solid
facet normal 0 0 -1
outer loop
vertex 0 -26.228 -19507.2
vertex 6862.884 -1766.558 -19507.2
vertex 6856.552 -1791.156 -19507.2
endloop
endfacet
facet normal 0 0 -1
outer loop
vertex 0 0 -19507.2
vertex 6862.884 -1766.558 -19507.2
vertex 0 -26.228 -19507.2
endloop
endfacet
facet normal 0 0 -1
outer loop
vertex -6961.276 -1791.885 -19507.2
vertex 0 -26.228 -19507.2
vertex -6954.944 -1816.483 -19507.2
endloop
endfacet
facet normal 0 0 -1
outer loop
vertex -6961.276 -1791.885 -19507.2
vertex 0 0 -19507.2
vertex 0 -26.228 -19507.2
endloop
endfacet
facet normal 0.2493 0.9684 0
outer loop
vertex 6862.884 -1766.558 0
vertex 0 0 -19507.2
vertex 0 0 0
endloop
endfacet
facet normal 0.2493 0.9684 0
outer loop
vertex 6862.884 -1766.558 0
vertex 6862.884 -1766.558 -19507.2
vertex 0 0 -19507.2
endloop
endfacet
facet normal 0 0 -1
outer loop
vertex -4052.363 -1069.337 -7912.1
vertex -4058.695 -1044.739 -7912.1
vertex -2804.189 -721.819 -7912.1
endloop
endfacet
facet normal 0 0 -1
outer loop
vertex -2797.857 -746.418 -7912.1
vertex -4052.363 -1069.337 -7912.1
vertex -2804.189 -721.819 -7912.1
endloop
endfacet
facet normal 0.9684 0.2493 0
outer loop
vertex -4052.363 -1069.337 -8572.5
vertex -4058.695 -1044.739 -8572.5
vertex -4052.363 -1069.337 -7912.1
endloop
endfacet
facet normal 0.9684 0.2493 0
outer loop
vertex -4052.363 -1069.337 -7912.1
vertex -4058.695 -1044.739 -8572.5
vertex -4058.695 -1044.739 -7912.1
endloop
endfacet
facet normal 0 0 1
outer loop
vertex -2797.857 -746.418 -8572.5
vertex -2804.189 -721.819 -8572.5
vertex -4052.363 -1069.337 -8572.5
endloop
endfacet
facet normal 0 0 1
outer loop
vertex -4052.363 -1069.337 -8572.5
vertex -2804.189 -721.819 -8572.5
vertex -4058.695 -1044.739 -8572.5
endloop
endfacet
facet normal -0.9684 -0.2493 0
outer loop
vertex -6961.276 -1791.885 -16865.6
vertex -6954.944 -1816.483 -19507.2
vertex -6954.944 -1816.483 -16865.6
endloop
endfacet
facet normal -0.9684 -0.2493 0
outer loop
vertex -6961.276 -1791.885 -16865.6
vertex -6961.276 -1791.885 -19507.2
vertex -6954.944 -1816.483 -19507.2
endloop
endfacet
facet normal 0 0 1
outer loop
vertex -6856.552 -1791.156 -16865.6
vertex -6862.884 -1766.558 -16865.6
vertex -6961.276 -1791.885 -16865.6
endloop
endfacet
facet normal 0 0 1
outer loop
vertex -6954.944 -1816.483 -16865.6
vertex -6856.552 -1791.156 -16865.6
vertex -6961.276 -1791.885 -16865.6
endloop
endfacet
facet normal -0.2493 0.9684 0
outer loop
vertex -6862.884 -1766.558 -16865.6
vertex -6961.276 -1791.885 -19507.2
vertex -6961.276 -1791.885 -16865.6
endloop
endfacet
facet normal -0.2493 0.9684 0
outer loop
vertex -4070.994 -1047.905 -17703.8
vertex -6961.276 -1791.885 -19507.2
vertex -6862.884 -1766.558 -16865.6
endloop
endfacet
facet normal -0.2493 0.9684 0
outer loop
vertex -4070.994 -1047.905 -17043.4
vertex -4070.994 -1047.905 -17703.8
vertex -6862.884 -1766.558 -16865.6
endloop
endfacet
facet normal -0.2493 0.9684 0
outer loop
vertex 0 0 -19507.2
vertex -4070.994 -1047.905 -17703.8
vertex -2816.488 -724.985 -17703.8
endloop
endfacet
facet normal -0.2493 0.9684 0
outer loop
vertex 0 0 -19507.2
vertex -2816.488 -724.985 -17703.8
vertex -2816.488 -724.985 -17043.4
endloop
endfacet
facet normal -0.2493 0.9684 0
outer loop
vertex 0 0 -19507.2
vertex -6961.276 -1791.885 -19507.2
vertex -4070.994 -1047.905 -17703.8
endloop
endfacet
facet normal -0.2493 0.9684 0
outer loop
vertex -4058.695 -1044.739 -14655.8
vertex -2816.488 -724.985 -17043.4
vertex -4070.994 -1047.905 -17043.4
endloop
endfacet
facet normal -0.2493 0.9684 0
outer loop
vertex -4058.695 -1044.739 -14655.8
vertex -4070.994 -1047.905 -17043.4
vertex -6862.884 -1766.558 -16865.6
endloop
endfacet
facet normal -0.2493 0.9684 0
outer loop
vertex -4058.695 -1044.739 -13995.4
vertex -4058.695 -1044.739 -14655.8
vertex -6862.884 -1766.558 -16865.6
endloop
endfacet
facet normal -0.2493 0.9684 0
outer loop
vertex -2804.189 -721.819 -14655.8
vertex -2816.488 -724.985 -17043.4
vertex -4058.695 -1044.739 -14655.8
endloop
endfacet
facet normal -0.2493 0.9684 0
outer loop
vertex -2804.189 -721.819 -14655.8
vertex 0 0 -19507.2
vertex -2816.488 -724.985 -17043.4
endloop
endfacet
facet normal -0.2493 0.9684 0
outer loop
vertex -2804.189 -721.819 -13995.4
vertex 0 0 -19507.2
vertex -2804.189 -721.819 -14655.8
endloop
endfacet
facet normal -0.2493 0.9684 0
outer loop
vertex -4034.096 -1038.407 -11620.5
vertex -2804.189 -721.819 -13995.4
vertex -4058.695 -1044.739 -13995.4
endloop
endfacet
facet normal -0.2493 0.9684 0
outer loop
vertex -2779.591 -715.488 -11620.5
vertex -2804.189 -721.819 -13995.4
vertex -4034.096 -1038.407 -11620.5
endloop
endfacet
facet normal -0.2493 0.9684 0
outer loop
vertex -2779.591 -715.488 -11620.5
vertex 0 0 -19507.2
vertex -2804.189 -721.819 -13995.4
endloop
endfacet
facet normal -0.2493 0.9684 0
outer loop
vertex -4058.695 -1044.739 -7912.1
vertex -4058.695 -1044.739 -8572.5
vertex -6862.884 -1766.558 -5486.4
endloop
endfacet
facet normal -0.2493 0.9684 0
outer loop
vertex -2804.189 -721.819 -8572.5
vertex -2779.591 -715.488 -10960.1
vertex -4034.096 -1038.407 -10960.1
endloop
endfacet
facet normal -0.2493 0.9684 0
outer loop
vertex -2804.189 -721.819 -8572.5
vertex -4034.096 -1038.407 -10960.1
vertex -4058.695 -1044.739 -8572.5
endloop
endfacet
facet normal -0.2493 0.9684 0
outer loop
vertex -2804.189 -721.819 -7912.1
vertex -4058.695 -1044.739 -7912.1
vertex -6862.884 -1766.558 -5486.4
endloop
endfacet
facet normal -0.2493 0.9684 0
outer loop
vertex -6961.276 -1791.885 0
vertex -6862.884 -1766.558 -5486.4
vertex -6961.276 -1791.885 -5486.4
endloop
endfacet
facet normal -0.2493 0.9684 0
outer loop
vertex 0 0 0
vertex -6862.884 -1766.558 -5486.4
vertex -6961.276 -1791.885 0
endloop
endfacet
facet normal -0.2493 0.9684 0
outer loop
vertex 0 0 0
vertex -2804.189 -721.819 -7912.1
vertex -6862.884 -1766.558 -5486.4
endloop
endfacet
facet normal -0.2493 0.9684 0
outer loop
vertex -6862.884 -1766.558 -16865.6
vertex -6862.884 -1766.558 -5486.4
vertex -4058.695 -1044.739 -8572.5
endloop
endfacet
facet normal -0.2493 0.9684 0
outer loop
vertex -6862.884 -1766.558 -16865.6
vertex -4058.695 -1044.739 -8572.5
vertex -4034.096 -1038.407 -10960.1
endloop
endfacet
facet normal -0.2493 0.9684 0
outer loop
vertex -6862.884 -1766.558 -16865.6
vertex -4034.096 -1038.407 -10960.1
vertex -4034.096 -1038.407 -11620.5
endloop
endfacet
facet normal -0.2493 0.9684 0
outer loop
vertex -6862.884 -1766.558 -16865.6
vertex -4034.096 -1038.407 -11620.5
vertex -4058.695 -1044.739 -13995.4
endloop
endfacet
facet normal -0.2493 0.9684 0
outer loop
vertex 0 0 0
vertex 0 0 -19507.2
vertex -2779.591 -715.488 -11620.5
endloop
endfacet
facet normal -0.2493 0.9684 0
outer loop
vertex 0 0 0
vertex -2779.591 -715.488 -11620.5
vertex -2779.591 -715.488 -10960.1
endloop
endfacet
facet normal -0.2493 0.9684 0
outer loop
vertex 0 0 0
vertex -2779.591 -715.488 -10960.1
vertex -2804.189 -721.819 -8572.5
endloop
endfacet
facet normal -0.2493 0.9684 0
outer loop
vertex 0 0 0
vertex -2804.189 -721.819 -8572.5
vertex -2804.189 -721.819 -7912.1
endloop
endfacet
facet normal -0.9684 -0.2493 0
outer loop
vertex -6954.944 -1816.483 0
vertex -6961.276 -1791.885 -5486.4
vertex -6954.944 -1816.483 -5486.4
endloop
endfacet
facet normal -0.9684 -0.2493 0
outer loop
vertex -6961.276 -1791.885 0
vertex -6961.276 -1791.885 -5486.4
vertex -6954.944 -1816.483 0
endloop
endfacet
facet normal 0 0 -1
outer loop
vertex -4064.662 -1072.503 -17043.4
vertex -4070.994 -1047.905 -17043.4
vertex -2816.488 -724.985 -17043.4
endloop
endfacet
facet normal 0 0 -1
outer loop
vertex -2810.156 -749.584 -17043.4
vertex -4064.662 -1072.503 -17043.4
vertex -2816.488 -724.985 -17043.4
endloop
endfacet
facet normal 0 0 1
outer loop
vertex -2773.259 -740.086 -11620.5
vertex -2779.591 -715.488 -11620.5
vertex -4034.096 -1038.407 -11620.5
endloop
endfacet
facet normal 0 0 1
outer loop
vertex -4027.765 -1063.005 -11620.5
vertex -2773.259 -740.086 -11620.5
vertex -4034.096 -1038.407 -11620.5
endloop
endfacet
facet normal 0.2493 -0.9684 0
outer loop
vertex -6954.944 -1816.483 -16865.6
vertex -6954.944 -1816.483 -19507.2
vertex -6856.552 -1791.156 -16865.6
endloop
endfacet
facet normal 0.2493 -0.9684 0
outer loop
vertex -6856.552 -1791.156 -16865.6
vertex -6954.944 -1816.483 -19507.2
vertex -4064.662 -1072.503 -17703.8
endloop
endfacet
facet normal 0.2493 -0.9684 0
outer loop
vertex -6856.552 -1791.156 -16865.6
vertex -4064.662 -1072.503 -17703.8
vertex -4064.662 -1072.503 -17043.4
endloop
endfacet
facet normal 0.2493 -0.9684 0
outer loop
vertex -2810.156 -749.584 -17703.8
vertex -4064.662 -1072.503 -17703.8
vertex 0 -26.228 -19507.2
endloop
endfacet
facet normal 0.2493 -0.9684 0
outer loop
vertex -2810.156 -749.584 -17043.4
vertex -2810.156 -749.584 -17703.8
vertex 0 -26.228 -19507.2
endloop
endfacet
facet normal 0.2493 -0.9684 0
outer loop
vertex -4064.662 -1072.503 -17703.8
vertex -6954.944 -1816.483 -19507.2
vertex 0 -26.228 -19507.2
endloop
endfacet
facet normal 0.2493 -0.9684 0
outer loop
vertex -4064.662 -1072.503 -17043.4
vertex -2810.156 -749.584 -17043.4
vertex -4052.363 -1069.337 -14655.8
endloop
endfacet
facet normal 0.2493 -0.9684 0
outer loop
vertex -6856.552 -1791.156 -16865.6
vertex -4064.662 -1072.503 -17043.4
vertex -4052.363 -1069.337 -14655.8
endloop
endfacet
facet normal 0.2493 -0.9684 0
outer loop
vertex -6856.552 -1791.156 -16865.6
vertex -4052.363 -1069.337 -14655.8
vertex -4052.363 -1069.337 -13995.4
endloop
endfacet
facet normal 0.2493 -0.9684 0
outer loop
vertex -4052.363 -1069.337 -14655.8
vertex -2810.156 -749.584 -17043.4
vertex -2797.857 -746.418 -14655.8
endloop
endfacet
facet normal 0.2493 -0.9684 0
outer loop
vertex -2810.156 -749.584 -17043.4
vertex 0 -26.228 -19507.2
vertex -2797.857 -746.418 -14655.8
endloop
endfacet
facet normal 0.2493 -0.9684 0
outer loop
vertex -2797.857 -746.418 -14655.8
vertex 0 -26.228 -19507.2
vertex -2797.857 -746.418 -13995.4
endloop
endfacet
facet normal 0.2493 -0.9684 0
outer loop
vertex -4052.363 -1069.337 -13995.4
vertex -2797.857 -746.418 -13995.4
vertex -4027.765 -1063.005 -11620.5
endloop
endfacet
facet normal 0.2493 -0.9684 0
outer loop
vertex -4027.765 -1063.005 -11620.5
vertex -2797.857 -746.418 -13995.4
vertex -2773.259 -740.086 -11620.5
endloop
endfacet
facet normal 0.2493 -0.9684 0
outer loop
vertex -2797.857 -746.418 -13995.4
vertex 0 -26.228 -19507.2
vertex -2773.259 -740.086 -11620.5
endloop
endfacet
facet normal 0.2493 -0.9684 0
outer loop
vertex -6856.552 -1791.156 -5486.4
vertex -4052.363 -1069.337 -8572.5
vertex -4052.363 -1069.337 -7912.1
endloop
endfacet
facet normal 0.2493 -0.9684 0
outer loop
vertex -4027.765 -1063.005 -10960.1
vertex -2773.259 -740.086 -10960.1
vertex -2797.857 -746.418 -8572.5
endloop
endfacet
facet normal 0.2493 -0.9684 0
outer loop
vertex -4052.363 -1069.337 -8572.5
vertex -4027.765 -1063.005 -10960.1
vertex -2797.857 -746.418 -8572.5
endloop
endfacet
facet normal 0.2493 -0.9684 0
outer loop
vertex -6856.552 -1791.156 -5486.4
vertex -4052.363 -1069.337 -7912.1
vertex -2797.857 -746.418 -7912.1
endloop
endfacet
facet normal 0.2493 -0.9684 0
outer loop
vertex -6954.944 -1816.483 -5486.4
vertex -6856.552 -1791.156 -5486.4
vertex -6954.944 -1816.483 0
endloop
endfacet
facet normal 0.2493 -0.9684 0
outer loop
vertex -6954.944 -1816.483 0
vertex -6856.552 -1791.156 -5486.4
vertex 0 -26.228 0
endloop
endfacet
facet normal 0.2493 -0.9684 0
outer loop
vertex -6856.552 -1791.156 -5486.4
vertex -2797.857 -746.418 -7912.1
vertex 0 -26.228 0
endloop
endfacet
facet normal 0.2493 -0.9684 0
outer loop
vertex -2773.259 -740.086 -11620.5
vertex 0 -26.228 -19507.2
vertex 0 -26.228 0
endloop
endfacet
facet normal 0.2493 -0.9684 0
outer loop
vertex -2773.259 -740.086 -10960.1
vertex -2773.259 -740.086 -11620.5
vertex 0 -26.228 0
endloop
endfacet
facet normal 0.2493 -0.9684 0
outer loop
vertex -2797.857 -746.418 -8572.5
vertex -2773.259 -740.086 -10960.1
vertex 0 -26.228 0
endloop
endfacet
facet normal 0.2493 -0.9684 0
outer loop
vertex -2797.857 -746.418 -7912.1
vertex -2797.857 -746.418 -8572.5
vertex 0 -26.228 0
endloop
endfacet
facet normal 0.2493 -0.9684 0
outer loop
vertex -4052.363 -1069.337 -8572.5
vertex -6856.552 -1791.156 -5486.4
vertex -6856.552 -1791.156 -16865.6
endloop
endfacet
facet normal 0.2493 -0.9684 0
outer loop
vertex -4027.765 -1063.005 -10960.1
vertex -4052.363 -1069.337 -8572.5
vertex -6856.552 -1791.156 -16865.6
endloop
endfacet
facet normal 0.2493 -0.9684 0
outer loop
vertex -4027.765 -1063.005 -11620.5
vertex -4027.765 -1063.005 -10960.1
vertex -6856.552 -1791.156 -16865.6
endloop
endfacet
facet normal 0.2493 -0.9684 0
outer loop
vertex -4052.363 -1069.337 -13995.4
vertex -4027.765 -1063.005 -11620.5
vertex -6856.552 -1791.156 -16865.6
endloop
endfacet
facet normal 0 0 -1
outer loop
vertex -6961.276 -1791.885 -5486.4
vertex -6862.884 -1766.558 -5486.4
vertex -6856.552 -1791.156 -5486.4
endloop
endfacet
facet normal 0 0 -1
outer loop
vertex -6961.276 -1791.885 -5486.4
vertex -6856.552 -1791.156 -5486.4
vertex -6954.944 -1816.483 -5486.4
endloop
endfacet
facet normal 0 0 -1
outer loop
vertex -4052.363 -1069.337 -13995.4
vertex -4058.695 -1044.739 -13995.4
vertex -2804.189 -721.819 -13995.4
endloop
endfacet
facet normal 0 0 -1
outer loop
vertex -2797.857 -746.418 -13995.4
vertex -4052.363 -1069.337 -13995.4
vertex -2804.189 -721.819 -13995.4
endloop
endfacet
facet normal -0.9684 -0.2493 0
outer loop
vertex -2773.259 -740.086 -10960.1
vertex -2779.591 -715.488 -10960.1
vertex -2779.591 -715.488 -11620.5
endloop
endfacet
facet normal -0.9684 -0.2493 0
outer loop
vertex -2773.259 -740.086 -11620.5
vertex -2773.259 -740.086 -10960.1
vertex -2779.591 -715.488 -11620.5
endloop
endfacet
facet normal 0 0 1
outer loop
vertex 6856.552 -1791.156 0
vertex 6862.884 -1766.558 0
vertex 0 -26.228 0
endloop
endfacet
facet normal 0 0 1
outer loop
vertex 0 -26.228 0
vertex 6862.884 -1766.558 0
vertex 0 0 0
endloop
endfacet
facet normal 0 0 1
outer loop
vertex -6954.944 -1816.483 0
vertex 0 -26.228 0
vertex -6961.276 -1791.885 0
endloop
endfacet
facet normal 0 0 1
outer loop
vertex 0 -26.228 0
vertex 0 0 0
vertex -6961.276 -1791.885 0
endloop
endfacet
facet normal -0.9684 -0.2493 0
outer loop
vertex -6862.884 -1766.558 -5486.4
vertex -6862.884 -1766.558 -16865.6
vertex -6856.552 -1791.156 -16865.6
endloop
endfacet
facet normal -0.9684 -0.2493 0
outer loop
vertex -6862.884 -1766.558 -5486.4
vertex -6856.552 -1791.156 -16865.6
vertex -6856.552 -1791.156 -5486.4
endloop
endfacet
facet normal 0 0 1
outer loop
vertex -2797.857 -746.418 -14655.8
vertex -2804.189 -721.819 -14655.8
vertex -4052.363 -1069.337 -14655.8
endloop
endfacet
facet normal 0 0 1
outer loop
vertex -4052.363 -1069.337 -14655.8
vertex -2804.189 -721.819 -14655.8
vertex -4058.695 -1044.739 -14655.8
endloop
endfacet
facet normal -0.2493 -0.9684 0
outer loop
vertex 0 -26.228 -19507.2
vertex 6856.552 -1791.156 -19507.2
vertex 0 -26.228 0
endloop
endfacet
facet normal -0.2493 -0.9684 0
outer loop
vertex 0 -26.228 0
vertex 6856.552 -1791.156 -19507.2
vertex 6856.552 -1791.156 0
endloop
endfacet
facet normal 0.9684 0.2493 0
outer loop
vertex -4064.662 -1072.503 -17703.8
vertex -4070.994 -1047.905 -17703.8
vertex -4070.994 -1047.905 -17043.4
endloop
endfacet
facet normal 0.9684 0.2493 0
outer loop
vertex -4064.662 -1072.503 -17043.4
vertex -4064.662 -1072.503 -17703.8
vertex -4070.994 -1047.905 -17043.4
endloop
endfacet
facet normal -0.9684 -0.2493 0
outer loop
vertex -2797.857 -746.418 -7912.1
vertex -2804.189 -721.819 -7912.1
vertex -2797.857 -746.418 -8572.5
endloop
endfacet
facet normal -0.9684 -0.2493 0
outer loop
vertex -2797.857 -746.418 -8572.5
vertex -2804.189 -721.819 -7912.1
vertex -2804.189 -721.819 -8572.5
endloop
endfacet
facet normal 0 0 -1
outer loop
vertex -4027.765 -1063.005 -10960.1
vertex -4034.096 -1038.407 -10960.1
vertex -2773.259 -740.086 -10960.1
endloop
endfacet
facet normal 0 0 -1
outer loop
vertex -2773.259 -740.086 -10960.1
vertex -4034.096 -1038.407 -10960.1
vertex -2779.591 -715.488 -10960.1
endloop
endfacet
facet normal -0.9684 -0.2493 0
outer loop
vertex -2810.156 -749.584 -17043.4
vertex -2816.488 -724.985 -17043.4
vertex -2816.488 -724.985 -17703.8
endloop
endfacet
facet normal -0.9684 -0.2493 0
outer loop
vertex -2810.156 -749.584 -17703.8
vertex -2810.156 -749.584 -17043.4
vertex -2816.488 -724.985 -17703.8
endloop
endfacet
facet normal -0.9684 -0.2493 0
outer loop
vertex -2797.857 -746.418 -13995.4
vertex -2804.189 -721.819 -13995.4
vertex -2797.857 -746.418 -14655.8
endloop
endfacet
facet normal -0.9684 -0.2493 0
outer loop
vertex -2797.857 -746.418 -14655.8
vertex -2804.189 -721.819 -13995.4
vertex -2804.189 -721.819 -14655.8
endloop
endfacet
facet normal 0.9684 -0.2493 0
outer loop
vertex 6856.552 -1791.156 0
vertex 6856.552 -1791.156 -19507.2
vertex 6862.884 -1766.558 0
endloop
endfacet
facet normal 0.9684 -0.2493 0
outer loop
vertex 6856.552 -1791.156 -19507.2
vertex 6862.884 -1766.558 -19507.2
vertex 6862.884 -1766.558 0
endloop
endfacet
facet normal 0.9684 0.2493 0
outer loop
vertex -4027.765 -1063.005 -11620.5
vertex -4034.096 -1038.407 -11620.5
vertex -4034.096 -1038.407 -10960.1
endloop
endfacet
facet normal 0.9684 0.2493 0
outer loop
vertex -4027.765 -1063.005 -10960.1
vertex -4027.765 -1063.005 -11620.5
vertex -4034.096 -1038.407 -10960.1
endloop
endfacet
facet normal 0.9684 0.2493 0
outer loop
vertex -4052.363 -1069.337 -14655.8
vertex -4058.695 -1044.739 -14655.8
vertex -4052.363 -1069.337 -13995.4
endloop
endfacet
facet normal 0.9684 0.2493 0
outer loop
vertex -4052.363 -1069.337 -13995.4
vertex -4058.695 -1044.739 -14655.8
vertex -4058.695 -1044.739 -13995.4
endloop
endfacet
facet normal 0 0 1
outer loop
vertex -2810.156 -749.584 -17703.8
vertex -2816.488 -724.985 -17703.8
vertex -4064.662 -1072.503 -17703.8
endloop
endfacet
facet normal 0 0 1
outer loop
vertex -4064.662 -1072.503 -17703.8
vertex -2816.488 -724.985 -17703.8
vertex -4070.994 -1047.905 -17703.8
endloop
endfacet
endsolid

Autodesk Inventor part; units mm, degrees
ref_plane "YZ Plane" through (0, 0, 0) normal (1, 0, 0) x (0, 1, 0)
ref_plane "XY Plane" through (0, 0, 0) normal (0, 0, 1) x (1, 0, 0)
ref_plane "southPlaneOfRoof" through (0, 0, 0) normal (-0.2492815, 0.9684311, 0) x (0, 0, 1)
ref_plane "norhtPlaneOfRoof" through (0, 0, 0) normal (0.2492815, 0.9684311, 0) x (0, 0, 1)
sketch "Sketch3" plane through (0, 0, 0) normal (-0.2492815, 0.9684311, 0) x (0, 0, 1)
  line L0 (0, 0) -> (-19507.2, 0)
  line L1 (-19507.2, 0) -> (-19507.2, -7086.6)
  line L2 (0, 0) -> (0, -7086.6)
  line L3 (0, -7086.6) -> (0, -25.4)
  line L4 (-19507.2, -7086.6) -> (0, -7086.6)
  line L5 (-17703.8, -4203.7) -> (-17043.4, -4203.7)
  line L6 (-17043.4, -4203.7) -> (-17043.4, -2908.3)
  line L7 (-17043.4, -2908.3) -> (-17703.8, -2908.3)
  line L8 (-17703.8, -2908.3) -> (-17703.8, -4203.7)
  line L9 (-14655.8, -4191) -> (-13995.4, -4191)
  line L10 (-13995.4, -4191) -> (-13995.4, -2895.6)
  line L11 (-13995.4, -2895.6) -> (-14655.8, -2895.6)
  line L12 (-14655.8, -2895.6) -> (-14655.8, -4191)
  line L13 (-11620.5, -4165.6) -> (-10960.1, -4165.6)
  line L14 (-10960.1, -4165.6) -> (-10960.1, -2870.2)
  line L15 (-10960.1, -2870.2) -> (-11620.5, -2870.2)
  line L16 (-11620.5, -2870.2) -> (-11620.5, -4165.6)
  line L17 (-8572.5, -4191) -> (-7912.1, -4191)
  line L18 (-7912.1, -4191) -> (-7912.1, -2895.6)
  line L19 (-7912.1, -2895.6) -> (-8572.5, -2895.6)
  line L20 (-8572.5, -2895.6) -> (-8572.5, -4191)
  line L21 (0, -7086.6) -> (0, -7188.2)
  line L22 (-5486.4, -7086.6) -> (-5486.4, -7188.2)
  line L23 (-5486.4, -7188.2) -> (0, -7188.2)
  line L24 (-19507.2, -7086.6) -> (-19507.2, -7188.2)
  line L25 (-16865.6, -7086.6) -> (-16865.6, -7188.2)
  line L26 (-19507.2, -7188.2) -> (-16865.6, -7188.2)
  dimension "d9" = 19507.2
  dimension "d10" = 7086.6
  dimension "d11" = 7061.2
  dimension "d15" = 660.4
  dimension "d16" = 1295.4
  dimension "d17" = 1803.4
  dimension "d18" = 2387.6
  dimension "d19" = 2374.9
  dimension "d20" = 2387.6
  dimension "d21" = 2908.3
  dimension "d22" = 2895.6
  dimension "d23" = 2870.2
  dimension "d24" = 2895.6
  dimension "d29" = 101.6
  dimension "d30" = 5486.4
  dimension "d31" = 101.6
  dimension "d32" = 2641.6
sketch "Sketch4" plane through (0, 0, 0) normal (0.2492815, 0.9684311, 0) x (0, 0, 1)
  line L0 (0, 0) -> (0, 7086.6)
  line L1 (0, 0) -> (-19507.2, 0)
  line L2 (-19507.2, 0) -> (-19507.2, 7086.6)
  line L3 (-19507.2, 7086.6) -> (0, 7086.6)
  dimension "d12" = 7086.6
  dimension "d13" = 19507.2
  dimension "d14" = 7086.6
extrude "Extrusion2" add sketch "Sketch3" against normal blind 25.4
extrude "Extrusion3" add sketch "Sketch4" against normal blind 25.4
equation "\"pitch_4_12\" = 14.435deg"
equation "\"d7\" = pitch_4_12"
equation "\"d8\" = -pitch_4_12"
properties part number "garageRoof"
